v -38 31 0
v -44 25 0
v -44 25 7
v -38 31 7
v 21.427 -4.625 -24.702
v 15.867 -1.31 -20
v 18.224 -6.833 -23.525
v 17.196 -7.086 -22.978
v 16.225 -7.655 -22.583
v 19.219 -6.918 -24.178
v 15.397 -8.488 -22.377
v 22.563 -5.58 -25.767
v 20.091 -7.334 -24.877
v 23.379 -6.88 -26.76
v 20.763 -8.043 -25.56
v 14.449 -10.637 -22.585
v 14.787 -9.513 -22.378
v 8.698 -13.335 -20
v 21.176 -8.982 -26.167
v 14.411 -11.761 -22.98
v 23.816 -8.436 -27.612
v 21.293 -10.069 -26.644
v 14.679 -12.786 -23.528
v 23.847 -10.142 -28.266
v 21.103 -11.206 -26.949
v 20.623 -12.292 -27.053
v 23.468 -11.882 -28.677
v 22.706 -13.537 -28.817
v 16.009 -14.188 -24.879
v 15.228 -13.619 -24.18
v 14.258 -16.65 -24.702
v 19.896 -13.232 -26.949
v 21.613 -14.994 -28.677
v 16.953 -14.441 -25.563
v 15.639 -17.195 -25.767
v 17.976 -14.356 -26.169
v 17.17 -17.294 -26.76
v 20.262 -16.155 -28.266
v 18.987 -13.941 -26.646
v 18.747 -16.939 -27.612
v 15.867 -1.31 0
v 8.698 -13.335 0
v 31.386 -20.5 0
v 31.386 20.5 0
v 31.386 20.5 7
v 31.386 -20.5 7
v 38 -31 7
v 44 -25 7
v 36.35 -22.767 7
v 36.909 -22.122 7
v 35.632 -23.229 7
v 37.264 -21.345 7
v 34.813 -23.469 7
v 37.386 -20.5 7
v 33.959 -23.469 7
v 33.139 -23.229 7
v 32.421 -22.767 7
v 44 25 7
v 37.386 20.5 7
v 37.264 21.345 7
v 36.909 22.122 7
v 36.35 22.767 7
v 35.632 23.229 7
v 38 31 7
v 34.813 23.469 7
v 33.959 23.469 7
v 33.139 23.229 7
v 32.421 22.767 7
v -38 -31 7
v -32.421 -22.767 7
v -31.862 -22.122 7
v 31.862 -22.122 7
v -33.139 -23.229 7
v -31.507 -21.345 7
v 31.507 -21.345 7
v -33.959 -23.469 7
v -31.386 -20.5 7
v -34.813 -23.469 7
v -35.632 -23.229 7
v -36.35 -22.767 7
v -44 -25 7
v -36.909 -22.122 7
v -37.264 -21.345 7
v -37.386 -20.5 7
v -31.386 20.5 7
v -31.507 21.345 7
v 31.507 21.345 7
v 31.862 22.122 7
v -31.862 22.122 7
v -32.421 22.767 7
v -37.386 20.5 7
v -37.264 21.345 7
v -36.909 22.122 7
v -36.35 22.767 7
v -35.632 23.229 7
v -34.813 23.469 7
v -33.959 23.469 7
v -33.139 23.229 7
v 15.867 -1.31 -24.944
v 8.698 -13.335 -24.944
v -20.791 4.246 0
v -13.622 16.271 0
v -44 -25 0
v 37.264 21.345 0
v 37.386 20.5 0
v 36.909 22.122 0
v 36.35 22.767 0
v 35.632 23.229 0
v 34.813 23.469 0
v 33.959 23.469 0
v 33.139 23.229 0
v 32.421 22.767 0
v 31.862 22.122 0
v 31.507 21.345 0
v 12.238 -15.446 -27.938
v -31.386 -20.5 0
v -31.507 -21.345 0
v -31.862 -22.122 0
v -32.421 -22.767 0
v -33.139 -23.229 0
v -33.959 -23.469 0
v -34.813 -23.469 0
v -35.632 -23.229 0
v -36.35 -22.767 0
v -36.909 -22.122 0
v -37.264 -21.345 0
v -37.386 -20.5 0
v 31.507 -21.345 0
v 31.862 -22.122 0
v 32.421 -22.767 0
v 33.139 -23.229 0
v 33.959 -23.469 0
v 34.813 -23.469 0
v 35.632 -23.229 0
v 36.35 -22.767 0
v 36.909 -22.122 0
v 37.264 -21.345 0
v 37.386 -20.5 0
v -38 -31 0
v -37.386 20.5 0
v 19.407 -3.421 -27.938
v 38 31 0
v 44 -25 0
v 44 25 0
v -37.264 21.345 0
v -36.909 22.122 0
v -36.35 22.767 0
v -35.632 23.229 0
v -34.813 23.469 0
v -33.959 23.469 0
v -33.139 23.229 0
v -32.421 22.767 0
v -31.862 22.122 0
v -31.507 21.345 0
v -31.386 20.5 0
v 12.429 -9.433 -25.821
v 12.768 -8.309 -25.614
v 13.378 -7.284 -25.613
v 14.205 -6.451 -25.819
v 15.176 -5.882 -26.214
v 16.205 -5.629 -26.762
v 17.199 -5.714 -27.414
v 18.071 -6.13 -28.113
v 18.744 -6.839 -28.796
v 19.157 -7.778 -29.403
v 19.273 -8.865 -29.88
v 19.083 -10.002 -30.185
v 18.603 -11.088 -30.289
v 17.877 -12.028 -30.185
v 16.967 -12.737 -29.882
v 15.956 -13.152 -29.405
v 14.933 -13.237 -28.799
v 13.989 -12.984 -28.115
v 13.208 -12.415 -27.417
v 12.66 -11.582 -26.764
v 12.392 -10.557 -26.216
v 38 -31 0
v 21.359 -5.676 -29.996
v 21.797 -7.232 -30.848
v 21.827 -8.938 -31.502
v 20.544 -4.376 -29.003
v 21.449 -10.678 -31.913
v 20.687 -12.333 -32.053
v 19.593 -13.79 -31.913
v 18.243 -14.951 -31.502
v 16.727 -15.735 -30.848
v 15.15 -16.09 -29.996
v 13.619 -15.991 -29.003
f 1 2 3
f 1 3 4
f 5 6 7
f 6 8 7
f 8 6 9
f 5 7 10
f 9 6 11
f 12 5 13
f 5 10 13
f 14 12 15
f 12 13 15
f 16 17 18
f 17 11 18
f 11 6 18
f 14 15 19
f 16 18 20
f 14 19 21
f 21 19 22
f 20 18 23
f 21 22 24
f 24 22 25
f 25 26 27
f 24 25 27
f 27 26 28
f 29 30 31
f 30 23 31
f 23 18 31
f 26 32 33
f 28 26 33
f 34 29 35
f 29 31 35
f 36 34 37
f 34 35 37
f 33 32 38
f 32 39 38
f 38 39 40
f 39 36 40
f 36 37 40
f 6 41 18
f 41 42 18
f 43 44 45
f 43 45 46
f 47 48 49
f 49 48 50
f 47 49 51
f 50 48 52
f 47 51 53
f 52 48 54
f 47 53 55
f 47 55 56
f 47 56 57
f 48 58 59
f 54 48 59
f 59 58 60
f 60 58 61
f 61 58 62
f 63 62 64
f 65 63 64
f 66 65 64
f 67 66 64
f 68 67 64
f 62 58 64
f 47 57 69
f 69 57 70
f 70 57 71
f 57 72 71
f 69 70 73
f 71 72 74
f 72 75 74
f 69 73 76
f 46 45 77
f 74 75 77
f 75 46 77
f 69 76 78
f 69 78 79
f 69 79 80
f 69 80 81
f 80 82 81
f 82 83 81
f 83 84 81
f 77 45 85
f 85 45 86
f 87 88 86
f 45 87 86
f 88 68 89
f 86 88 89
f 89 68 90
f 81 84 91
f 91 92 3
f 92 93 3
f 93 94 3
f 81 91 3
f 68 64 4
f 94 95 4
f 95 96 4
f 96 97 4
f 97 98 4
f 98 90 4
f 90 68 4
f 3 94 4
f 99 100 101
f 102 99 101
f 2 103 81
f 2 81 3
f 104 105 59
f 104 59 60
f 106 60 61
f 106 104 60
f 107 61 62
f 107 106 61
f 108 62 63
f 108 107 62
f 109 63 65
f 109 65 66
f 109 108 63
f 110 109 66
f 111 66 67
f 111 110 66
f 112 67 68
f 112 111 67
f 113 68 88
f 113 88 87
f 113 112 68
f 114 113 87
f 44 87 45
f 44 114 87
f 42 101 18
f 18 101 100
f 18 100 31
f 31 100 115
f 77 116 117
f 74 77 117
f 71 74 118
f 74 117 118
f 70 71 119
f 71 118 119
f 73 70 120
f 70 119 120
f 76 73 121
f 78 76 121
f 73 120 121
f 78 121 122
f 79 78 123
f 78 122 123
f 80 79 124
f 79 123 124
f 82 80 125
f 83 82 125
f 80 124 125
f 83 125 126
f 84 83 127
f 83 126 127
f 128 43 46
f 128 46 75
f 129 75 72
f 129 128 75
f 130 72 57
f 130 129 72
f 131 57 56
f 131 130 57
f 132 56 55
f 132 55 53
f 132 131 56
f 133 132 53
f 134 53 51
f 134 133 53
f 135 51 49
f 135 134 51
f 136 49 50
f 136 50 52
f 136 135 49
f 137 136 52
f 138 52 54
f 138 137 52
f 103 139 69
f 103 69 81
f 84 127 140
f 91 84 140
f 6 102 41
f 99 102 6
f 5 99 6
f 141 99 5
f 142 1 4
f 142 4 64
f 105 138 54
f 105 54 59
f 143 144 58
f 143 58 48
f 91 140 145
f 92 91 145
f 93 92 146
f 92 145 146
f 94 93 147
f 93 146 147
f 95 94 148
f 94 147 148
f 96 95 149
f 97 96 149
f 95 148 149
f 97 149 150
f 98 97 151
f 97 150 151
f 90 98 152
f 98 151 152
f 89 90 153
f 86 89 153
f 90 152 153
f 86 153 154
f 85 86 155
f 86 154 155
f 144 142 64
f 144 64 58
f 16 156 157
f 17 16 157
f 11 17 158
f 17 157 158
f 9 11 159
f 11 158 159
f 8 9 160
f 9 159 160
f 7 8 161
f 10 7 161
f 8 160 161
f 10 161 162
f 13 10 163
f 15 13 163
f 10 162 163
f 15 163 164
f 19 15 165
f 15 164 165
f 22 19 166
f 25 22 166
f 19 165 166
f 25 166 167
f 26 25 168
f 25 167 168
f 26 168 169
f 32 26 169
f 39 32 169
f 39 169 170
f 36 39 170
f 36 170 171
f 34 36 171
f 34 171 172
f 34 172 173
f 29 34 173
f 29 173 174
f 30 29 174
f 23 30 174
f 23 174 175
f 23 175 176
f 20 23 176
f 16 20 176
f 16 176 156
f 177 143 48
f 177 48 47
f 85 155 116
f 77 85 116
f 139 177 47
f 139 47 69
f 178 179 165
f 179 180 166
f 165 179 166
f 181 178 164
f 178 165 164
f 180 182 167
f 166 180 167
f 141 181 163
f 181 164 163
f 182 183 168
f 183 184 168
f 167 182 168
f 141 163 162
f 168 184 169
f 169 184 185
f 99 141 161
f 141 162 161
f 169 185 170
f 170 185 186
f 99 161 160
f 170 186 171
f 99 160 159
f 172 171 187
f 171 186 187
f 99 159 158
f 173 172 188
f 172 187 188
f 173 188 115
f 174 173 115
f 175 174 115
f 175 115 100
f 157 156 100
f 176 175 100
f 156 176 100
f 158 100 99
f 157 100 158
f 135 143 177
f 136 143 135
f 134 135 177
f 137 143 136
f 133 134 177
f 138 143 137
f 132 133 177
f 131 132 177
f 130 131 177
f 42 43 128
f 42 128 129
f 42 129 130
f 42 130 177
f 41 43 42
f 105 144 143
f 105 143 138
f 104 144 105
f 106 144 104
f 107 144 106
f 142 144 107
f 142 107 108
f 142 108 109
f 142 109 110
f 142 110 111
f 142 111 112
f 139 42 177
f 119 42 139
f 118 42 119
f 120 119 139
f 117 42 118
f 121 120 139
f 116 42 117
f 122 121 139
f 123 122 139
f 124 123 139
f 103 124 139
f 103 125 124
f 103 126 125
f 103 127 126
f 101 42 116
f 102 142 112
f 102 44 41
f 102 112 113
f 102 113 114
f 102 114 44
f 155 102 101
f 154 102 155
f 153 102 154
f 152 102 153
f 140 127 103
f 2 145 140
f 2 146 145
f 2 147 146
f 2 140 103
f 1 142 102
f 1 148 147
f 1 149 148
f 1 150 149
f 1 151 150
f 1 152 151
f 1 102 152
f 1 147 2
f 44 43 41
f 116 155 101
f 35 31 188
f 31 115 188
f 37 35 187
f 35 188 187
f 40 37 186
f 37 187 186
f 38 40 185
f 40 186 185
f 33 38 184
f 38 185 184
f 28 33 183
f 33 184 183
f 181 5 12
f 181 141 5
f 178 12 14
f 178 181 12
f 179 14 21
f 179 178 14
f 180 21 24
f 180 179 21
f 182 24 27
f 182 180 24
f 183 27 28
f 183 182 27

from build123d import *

# Parameters (mm, degrees)
BOSS_EXTRUDE1_DEPTH = 7
BOSS_EXTRUDE2_DEPTH = 7
FILLET1_R           = 7
CUT_EXTRUDE1_REACH  = 66.771
SKETCH6_R           = 4


with BuildPart() as part:
    # Sketch1 → Boss-Extrude1 (new body)
    with BuildSketch(Plane.XY):
        Polygon((-44, 25), (-38, 31), (38, 31), (44, 25), (44, -25), (38, -31), (-38, -31), (-44, -25), align=None)
        with BuildLine():
            Line((-31.385621722, 20.5), (-31.385621722, -20.5))
            ThreePointArc((-31.385621722, -20.5), (-34.385621722, -23.5), (-37.385621722, -20.5))
            Line((-37.385621722, -20.5), (-37.385621722, 20.5))
            ThreePointArc((-37.385621722, 20.5), (-34.385621722, 23.5), (-31.385621722, 20.5))
        make_face(mode=Mode.SUBTRACT)
        with BuildLine():
            Line((31.385621722, 20.5), (31.385621722, -20.5))
            ThreePointArc((31.385621722, -20.5), (34.385621722, -23.5), (37.385621722, -20.5))
            Line((37.385621722, -20.5), (37.385621722, 20.5))
            ThreePointArc((37.385621722, 20.5), (34.385621722, 23.5), (31.385621722, 20.5))
        make_face(mode=Mode.SUBTRACT)
    extrude(amount=BOSS_EXTRUDE1_DEPTH)

    # Sketch2 → Boss-Extrude2 (add, symmetric)
    with BuildSketch(Plane(origin=(0, 0, 0), x_dir=(-0.8589373126285005, 0.5120807484904403, 0), z_dir=(-0.5120807484904403, -0.8589373126285005, 0))):
        Polygon((20.032748859, 0), (-14.300096017, 0), (-14.300096017, 20), (-26.435350933, 28.816778784), (-24.084209923, 32.052846762), (-14.300096017, 24.94427191), align=None)
    extrude(amount=BOSS_EXTRUDE2_DEPTH, both=True)

    # Fillet1
    fillet1_edges = [part.edges().sort_by_distance(p)[0] for p in [
        (25.281133158, -6.92248608, -30.434812773),
        (18.112002679, -18.947608457, -30.434812773),
    ]]
    fillet(fillet1_edges, radius=FILLET1_R - 0.0001)  # a hair under: the kernel refuses the full size

    # Sketch6 → Cut-Extrude1 (cut, up to next)
    with BuildSketch(Plane(origin=(-5.944829265, 3.544184861, -9.526138171), x_dir=(-0.8631949903821312, -0.17604689815365596, 0.4731827323874666), z_dir=(-0.5048706850067575, 0.30099351194556917, -0.8090169943749512)), mode=Mode.PRIVATE) as cut_extrude1_sk1:
        with Locations(Location((-25.217235821, -18.583042284, 0), (0, 0, 10.638271161))):
            Circle(SKETCH6_R)
    cut_extrude1_tool1 = extrude(cut_extrude1_sk1.sketch, amount=-CUT_EXTRUDE1_REACH, mode=Mode.PRIVATE) & part.part
    add(cut_extrude1_tool1.solids().sort_by_distance((15.822562, -9.433086, -27.93835))[0], mode=Mode.SUBTRACT)


solid = part.part
